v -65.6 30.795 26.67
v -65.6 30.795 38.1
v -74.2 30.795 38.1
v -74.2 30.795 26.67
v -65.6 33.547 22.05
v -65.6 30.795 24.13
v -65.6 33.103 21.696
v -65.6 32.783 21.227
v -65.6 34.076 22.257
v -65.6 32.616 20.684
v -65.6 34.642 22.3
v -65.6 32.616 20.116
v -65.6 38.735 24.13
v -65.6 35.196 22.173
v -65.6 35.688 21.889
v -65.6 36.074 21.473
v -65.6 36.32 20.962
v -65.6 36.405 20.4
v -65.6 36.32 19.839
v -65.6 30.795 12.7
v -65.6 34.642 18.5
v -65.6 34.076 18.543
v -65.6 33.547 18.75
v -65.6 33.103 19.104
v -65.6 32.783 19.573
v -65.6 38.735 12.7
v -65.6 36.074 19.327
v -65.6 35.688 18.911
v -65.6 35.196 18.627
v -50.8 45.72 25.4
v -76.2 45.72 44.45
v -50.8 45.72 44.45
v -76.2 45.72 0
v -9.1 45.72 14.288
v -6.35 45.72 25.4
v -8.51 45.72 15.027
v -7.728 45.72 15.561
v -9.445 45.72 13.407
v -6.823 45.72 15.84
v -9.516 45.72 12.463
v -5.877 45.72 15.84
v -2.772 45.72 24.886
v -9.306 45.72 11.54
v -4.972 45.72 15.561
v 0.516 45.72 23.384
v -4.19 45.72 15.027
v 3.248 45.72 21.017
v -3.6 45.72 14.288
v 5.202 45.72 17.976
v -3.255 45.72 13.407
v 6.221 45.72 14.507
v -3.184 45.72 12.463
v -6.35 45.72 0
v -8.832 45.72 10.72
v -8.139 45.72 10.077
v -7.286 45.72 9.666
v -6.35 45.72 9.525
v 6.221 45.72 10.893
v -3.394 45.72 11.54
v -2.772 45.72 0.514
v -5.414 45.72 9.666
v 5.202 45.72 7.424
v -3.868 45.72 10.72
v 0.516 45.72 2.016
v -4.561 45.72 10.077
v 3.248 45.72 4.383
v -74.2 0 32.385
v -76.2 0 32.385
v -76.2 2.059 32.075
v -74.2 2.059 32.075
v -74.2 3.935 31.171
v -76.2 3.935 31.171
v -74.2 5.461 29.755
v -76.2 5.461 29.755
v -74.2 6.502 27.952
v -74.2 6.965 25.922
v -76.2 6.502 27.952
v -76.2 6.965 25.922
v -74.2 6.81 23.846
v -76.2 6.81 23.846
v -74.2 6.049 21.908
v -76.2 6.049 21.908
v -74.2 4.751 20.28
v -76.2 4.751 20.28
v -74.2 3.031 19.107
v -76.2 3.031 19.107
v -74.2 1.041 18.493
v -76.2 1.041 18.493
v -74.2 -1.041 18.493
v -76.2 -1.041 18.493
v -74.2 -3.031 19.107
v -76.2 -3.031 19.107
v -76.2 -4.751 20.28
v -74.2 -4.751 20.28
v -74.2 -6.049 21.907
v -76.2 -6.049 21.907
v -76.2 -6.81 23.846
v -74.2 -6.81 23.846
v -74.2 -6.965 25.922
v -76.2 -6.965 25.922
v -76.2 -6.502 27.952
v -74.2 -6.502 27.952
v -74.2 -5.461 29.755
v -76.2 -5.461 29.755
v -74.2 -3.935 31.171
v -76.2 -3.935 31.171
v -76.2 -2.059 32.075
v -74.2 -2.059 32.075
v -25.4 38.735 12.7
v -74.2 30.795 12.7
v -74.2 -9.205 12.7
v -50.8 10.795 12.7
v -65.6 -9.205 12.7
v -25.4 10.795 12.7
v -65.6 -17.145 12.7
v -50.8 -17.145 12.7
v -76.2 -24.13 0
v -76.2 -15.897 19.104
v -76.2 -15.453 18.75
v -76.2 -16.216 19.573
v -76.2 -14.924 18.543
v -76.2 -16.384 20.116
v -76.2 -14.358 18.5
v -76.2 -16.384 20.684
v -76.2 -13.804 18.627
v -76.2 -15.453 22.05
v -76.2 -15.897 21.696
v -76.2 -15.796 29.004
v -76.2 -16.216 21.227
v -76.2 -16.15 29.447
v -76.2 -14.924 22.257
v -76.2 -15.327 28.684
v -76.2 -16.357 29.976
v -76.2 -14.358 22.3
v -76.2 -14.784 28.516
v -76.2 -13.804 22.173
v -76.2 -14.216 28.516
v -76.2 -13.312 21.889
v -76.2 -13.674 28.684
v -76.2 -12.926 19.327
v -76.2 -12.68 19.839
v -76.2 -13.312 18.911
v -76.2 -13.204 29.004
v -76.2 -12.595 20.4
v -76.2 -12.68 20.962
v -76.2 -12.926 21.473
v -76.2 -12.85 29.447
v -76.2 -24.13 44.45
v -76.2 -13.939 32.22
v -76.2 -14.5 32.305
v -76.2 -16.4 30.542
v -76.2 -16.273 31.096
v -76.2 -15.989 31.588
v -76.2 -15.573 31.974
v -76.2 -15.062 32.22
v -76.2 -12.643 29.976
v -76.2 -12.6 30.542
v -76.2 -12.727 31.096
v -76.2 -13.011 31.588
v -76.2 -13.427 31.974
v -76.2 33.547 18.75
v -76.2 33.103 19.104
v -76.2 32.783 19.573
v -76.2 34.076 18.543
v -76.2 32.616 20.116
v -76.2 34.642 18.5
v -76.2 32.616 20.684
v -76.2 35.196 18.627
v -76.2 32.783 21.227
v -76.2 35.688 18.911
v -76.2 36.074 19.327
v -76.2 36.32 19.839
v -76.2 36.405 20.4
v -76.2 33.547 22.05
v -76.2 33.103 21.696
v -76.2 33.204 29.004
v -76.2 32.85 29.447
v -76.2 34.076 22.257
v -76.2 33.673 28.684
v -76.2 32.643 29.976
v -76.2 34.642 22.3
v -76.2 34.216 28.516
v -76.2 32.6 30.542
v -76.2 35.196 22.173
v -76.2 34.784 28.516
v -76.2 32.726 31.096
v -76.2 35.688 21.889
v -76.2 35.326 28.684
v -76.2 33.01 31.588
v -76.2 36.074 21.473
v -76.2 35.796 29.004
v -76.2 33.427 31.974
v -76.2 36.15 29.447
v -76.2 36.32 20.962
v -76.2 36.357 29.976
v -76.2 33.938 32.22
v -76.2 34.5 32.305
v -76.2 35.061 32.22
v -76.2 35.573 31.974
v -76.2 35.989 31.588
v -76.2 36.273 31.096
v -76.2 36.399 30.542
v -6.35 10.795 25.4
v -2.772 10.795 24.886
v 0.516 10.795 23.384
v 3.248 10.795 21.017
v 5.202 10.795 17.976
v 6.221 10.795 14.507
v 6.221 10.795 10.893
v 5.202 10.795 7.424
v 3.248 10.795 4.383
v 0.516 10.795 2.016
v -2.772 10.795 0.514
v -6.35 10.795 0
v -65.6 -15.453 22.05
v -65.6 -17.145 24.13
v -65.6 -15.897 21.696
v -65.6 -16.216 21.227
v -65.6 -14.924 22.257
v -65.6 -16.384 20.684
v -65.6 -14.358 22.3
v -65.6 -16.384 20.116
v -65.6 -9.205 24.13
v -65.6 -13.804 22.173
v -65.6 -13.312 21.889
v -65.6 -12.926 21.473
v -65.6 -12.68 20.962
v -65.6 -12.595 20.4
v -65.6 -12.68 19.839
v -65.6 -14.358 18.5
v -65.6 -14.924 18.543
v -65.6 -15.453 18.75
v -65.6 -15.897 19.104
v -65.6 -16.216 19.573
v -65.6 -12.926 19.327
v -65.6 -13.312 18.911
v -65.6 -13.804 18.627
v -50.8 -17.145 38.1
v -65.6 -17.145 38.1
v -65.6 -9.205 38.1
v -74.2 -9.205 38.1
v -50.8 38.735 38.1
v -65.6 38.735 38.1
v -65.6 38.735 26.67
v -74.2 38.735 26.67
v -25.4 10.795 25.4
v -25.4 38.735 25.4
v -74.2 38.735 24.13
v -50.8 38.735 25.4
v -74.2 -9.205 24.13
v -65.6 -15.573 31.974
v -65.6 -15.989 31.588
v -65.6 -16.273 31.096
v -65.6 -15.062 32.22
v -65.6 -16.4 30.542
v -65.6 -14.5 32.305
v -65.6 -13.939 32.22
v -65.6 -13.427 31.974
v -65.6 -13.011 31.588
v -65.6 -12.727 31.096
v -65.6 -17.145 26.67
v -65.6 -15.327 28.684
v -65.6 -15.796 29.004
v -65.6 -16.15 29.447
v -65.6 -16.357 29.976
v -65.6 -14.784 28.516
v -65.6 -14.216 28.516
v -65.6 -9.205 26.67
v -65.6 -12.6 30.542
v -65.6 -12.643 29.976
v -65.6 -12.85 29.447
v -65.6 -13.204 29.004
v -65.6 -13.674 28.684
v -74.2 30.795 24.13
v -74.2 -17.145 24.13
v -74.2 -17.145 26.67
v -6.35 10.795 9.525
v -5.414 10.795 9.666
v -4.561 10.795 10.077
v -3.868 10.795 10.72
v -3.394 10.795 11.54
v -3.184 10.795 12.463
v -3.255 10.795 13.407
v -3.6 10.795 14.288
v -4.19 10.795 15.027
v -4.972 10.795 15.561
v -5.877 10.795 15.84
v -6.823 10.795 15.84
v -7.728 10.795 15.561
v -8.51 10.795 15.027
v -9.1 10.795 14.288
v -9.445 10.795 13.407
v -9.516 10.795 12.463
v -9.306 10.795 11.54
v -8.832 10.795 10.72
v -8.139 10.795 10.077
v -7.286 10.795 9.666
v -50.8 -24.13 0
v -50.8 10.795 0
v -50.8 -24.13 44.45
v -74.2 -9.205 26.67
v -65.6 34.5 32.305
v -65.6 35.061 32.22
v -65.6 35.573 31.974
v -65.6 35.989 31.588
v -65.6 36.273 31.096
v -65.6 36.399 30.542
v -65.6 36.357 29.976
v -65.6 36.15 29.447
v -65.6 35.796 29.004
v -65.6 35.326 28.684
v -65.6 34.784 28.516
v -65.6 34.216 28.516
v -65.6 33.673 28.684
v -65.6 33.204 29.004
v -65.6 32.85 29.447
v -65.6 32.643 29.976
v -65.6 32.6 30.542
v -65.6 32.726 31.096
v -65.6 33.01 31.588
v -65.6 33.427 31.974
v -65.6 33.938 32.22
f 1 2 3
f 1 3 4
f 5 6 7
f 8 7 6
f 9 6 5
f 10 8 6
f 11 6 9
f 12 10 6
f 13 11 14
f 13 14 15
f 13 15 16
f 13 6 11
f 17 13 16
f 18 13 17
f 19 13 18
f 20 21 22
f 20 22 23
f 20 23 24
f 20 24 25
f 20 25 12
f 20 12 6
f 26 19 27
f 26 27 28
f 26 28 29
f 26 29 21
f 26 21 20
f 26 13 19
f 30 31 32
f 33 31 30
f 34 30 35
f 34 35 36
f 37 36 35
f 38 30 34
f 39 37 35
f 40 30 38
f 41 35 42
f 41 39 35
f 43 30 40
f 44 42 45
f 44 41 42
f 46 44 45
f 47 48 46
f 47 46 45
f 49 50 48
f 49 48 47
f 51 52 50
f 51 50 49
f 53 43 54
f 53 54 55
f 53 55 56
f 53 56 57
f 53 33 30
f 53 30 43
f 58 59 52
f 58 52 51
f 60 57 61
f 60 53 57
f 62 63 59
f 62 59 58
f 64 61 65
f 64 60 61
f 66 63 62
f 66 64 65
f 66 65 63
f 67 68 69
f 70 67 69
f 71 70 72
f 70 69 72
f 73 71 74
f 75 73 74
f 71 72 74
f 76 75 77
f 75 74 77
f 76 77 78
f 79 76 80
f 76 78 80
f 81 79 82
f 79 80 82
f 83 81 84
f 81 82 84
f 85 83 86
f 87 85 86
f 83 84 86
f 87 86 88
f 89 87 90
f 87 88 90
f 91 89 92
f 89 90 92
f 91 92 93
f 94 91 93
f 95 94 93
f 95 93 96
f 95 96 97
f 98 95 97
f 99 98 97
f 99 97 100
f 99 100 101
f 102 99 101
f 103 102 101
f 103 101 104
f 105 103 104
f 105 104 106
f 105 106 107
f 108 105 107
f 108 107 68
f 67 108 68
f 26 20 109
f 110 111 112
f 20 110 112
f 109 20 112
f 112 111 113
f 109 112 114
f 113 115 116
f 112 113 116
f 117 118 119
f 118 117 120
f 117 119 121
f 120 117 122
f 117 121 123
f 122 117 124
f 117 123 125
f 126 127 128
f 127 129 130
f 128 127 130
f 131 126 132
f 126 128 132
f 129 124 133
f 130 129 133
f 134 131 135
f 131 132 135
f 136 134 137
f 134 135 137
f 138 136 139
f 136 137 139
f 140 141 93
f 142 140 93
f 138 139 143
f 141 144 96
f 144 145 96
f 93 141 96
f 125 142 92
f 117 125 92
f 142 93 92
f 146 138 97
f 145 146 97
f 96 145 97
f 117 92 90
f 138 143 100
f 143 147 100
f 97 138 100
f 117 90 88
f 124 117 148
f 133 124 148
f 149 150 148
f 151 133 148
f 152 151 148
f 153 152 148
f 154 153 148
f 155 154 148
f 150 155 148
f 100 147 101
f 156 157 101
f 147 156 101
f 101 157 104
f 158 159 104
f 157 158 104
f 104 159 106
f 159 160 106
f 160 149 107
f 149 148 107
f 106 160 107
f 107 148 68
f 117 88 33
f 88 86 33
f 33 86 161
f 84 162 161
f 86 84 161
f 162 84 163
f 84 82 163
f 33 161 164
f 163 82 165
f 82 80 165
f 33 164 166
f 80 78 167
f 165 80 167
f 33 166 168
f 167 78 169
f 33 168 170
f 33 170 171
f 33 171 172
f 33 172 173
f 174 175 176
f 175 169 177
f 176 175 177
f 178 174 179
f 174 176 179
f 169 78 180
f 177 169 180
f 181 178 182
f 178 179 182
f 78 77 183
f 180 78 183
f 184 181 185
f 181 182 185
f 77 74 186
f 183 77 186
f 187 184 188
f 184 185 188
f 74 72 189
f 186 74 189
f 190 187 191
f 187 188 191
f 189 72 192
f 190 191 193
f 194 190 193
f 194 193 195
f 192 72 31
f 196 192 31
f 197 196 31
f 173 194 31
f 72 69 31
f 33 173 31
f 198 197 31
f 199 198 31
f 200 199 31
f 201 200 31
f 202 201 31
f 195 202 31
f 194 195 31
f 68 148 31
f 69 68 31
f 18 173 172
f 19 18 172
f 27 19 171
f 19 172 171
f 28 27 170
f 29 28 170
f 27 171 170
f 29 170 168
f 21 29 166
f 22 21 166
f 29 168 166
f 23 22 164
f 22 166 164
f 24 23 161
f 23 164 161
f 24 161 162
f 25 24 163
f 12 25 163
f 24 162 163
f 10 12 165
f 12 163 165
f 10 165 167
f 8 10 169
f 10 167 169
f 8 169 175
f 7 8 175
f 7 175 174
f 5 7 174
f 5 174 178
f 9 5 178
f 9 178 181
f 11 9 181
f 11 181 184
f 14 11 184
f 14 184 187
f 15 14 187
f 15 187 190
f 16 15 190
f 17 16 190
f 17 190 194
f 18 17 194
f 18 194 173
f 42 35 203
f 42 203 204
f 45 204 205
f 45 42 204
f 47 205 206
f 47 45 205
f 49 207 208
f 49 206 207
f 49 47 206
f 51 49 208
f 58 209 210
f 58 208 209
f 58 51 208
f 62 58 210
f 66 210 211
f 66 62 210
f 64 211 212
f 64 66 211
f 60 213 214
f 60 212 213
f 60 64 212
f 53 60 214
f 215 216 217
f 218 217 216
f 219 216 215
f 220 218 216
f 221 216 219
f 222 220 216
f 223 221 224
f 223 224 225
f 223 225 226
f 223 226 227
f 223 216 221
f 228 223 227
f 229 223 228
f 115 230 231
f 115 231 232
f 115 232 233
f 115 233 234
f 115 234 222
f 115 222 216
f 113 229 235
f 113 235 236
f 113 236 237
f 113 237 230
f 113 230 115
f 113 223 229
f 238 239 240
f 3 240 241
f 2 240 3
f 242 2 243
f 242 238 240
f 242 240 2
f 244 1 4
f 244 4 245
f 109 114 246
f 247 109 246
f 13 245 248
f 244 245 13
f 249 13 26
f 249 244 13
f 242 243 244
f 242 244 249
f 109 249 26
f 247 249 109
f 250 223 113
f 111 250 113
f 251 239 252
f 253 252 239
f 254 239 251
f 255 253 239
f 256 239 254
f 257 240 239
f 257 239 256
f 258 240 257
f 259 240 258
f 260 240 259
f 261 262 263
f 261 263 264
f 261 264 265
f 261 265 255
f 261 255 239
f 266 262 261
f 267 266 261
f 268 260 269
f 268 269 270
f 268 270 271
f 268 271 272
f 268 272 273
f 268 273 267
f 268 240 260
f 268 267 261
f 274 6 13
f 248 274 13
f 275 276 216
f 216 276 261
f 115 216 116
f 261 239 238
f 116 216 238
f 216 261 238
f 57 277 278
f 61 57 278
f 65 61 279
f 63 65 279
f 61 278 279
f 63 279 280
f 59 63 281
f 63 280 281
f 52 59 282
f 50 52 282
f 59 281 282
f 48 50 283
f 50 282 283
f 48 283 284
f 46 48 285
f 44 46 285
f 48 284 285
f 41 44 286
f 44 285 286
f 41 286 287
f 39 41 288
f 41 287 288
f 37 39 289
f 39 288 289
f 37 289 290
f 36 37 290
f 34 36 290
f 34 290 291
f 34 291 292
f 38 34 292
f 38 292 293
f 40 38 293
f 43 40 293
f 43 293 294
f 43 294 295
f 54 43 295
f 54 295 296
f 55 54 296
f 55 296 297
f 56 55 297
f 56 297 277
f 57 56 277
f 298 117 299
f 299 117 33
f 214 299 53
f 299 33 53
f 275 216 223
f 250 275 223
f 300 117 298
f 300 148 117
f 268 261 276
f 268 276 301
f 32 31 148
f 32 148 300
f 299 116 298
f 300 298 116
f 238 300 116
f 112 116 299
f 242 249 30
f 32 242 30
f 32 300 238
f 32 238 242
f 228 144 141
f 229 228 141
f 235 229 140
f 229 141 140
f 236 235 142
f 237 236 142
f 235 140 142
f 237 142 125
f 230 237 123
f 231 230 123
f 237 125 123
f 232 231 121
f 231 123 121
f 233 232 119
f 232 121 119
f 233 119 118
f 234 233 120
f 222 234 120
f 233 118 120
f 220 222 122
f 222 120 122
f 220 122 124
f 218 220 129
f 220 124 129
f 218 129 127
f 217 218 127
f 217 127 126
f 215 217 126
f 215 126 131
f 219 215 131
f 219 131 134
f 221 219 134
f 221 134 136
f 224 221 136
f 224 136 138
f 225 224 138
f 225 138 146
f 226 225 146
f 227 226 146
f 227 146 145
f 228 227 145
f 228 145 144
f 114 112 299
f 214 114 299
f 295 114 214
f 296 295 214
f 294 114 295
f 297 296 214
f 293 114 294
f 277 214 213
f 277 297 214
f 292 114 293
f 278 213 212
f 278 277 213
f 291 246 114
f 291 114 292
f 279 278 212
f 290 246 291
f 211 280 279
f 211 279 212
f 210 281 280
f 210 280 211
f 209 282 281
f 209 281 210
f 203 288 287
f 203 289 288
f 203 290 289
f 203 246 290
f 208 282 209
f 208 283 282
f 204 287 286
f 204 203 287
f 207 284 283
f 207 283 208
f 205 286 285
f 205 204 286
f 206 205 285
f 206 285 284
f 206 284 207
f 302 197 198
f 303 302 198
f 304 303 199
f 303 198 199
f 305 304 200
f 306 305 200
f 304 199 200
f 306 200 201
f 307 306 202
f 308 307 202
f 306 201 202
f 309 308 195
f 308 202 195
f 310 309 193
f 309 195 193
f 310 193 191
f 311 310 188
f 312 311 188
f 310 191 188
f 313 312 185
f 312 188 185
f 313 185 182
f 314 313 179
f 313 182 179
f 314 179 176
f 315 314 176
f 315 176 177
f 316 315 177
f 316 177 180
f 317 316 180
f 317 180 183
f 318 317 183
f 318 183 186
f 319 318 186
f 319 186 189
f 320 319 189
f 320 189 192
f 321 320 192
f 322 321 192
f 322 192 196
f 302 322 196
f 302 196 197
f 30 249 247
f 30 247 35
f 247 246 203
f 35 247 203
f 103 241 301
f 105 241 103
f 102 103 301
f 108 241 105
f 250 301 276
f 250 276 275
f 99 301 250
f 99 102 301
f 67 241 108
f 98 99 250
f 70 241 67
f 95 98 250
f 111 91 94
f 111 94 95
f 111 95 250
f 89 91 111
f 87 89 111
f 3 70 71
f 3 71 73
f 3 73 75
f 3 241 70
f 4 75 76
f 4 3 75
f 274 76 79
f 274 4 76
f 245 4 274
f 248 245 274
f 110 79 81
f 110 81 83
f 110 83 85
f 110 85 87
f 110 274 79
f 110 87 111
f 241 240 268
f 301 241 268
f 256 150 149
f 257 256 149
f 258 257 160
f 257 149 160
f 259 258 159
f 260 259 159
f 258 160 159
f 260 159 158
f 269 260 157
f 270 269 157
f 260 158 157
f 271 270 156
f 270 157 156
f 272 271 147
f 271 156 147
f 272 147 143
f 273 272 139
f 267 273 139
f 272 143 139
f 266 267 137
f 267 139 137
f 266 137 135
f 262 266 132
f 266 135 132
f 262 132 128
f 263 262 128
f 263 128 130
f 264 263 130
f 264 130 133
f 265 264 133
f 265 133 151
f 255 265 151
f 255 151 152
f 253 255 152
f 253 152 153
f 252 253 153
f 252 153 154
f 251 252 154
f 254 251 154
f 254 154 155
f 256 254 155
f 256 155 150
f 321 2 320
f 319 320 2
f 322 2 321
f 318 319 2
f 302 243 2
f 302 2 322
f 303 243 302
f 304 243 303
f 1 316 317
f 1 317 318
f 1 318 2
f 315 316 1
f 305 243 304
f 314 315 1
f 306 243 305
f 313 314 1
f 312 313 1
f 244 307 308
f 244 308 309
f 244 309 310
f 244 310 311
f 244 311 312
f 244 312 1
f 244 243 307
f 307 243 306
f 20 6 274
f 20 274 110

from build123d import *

# Parameters (mm, degrees)
SKETCH1_R                       = 19.05
SKETCH1_W                       = 152.4
SKETCH1_H                       = 38.1
BOSS_EXTRUDE1_DEPTH             = 25.4
SKETCH4_W                       = 25.4
SKETCH4_H                       = 69.85
BOSS_EXTRUDE3_DEPTH             = 19.05
BOSS_EXTRUDE3_DIRECTION_2_REACH = 102.402
SKETCH5_R                       = 6.985
SKETCH5_R_2                     = 1.905
CUT_EXTRUDE1_DEPTH              = 25.4
SKETCH13_W                      = 63.5
SKETCH13_H                      = 69.85
BOSS_EXTRUDE6_DEPTH             = 25.4
SKETCH7_W                       = 50.8
SKETCH7_H                       = 55.88
CUT_EXTRUDE2_DEPTH              = 25.4
SKETCH8_W                       = 25.4
SKETCH8_H                       = 39.99992
CUT_EXTRUDE3_DEPTH              = 23.400004
SKETCH9_W                       = 25.4
SKETCH9_H                       = 7.94004
CUT_EXTRUDE4_DEPTH              = 14.800072
SKETCH10_W                      = 2.54
SKETCH10_H                      = 7.94004
CUT_EXTRUDE5_DEPTH              = 8.599932
SKETCH11_R                      = 3.175
CUT_EXTRUDE6_DEPTH              = 109.664809851
BOSS_EXTRUDE7_DEPTH             = 55.88
CUT_EXTRUDE7_DEPTH              = 127.203753906
SKETCH16_W                      = 57.15
SKETCH16_H                      = 34.925
CUT_EXTRUDE8_DEPTH              = 93.422499425
SKETCH17_R                      = 3.175
CUT_EXTRUDE9_DEPTH              = 95.878860264


with BuildPart() as part:
    # Sketch1 → Boss-Extrude1 (new body)
    with BuildSketch(Plane.XY):
        with Locations((76.2, 0)):
            Circle(SKETCH1_R)
        Rectangle(SKETCH1_W, SKETCH1_H)
    extrude(amount=BOSS_EXTRUDE1_DEPTH)

    # Sketch4 → Boss-Extrude3 (add)
    with BuildSketch(Plane.XY.offset(25.4)):
        with Locations((-63.5, 10.795)):
            Rectangle(SKETCH4_W, SKETCH4_H)
    extrude(amount=BOSS_EXTRUDE3_DEPTH)

    # Boss-Extrude3 direction 2: up to this face of the body (flat: up to its plane)
    boss_extrude3_direction_2_end = Plane(part.part.faces().sort_by_distance((7.534927708, 0, 0))[0])
    # Sketch4 → Boss-Extrude3 direction 2 (add, up to the picked face)
    with BuildSketch(Plane.XY.offset(25.4), mode=Mode.PRIVATE) as boss_extrude3_direction_2_sk1:
        with Locations((-63.5, 10.795)):
            Rectangle(SKETCH4_W, SKETCH4_H)
    boss_extrude3_direction_2_tool1 = split(extrude(boss_extrude3_direction_2_sk1.sketch, amount=-BOSS_EXTRUDE3_DIRECTION_2_REACH, mode=Mode.PRIVATE), bisect_by=boss_extrude3_direction_2_end, keep=Keep.BOTH, mode=Mode.PRIVATE)
    add(boss_extrude3_direction_2_tool1.solids().sort_by(Axis((-63.5, 10.795, 25.4), (0, 0, -1)))[0])

    # Sketch5 → Cut-Extrude1 (cut)
    with BuildSketch(Plane.ZY.offset(76.2)):
        with Locations((25.4, 0)):
            Circle(SKETCH5_R)
        with Locations((30.39999, -14.500098)):
            Circle(SKETCH5_R_2)
        with Locations((30.39999, 34.499804)):
            Circle(SKETCH5_R_2)
        with Locations(Location((20.40001, 34.499804, 0), (0, 0, 90))):
            Circle(SKETCH5_R_2)
        with Locations(Location((20.40001, -14.500098, 0), (0, 0, 90))):
            Circle(SKETCH5_R_2)
    extrude(amount=-CUT_EXTRUDE1_DEPTH, mode=Mode.SUBTRACT)

    # Sketch13 → Boss-Extrude6 (add)
    with BuildSketch(Plane.XY.offset(25.4)):
        with Locations((-19.05, 10.795)):
            Rectangle(SKETCH13_W, SKETCH13_H)
    extrude(amount=-BOSS_EXTRUDE6_DEPTH)

    # Sketch7 → Cut-Extrude2 (cut)
    with BuildSketch(Plane.XY.offset(25.4)):
        with Locations((-25.4, 10.795)):
            Rectangle(SKETCH7_W, SKETCH7_H)
    extrude(amount=-CUT_EXTRUDE2_DEPTH, mode=Mode.SUBTRACT)

    # Sketch8 → Cut-Extrude3 (cut)
    with BuildSketch(Plane(origin=(-50.8, 0, 0), x_dir=(0, 0, -1), z_dir=(1, 0, 0))):
        with Locations((-25.4, 10.795)):
            Rectangle(SKETCH8_W, SKETCH8_H)
    extrude(amount=-CUT_EXTRUDE3_DEPTH, mode=Mode.SUBTRACT)

    # Sketch9 → Cut-Extrude4 (cut)
    with BuildSketch(Plane(origin=(-50.8, 0, 0), x_dir=(0, 0, -1), z_dir=(1, 0, 0))):
        with Locations((-25.4, 34.76498)):
            Rectangle(SKETCH9_W, SKETCH9_H)
        with Locations((-25.4, -13.17498)):
            Rectangle(SKETCH9_W, SKETCH9_H)
    extrude(amount=-CUT_EXTRUDE4_DEPTH, mode=Mode.SUBTRACT)

    # Sketch10 → Cut-Extrude5 (cut)
    with BuildSketch(Plane(origin=(-65.600072, 0, 0), x_dir=(0, 0, -1), z_dir=(1, 0, 0))):
        with Locations((-25.4, -13.17498)):
            Rectangle(SKETCH10_W, SKETCH10_H)
        with Locations((-25.4, 34.76498)):
            Rectangle(SKETCH10_W, SKETCH10_H)
    extrude(amount=-CUT_EXTRUDE5_DEPTH, mode=Mode.SUBTRACT)

    # Sketch11 → Cut-Extrude6 (cut, through all)
    with BuildSketch(Plane.XY.offset(25.4)):
        with Locations((76.2, 0)):
            Circle(SKETCH11_R)
    extrude(amount=-CUT_EXTRUDE6_DEPTH, mode=Mode.SUBTRACT)

    # Sketch14 → Boss-Extrude7 (add)
    with BuildSketch(Plane(origin=(0, -17.145, 0), x_dir=(1, 0, 0), z_dir=(0, 1, 0))):
        Polygon((-50.8, -12.7), (-25.4, -12.7), (-25.4, -25.4), (0, -25.4), (0, 0), (-50.8, 0), align=None)
    extrude(amount=BOSS_EXTRUDE7_DEPTH)

    # Sketch15 → Cut-Extrude7 (cut, through all)
    with BuildSketch(Plane(origin=(0, 45.72, 0), x_dir=(1, 0, 0), z_dir=(0, 1, 0))):
        with BuildLine():
            Line((-6.35, 0), (95.25, 0))
            Line((95.25, 0), (95.25, -25.4))
            Line((95.25, -25.4), (-6.35, -25.4))
            ThreePointArc((-6.35, -25.4), (6.35, -12.7), (-6.35, 0))
        make_face()
    extrude(amount=-CUT_EXTRUDE7_DEPTH, mode=Mode.SUBTRACT)

    # Sketch16 → Cut-Extrude8 (cut, through all)
    with BuildSketch(Plane.XY.offset(25.4)):
        with Locations((-22.225, -6.6675)):
            Rectangle(SKETCH16_W, SKETCH16_H)
    extrude(amount=-CUT_EXTRUDE8_DEPTH, mode=Mode.SUBTRACT)

    # Sketch17 → Cut-Extrude9 (cut, through all)
    with BuildSketch(Plane.XZ.offset(-10.795)):
        with Locations(Location((-6.35, 12.7, 0), (0, 0, 270))):
            Circle(SKETCH17_R)
    extrude(amount=-CUT_EXTRUDE9_DEPTH, mode=Mode.SUBTRACT)


solid = part.part
